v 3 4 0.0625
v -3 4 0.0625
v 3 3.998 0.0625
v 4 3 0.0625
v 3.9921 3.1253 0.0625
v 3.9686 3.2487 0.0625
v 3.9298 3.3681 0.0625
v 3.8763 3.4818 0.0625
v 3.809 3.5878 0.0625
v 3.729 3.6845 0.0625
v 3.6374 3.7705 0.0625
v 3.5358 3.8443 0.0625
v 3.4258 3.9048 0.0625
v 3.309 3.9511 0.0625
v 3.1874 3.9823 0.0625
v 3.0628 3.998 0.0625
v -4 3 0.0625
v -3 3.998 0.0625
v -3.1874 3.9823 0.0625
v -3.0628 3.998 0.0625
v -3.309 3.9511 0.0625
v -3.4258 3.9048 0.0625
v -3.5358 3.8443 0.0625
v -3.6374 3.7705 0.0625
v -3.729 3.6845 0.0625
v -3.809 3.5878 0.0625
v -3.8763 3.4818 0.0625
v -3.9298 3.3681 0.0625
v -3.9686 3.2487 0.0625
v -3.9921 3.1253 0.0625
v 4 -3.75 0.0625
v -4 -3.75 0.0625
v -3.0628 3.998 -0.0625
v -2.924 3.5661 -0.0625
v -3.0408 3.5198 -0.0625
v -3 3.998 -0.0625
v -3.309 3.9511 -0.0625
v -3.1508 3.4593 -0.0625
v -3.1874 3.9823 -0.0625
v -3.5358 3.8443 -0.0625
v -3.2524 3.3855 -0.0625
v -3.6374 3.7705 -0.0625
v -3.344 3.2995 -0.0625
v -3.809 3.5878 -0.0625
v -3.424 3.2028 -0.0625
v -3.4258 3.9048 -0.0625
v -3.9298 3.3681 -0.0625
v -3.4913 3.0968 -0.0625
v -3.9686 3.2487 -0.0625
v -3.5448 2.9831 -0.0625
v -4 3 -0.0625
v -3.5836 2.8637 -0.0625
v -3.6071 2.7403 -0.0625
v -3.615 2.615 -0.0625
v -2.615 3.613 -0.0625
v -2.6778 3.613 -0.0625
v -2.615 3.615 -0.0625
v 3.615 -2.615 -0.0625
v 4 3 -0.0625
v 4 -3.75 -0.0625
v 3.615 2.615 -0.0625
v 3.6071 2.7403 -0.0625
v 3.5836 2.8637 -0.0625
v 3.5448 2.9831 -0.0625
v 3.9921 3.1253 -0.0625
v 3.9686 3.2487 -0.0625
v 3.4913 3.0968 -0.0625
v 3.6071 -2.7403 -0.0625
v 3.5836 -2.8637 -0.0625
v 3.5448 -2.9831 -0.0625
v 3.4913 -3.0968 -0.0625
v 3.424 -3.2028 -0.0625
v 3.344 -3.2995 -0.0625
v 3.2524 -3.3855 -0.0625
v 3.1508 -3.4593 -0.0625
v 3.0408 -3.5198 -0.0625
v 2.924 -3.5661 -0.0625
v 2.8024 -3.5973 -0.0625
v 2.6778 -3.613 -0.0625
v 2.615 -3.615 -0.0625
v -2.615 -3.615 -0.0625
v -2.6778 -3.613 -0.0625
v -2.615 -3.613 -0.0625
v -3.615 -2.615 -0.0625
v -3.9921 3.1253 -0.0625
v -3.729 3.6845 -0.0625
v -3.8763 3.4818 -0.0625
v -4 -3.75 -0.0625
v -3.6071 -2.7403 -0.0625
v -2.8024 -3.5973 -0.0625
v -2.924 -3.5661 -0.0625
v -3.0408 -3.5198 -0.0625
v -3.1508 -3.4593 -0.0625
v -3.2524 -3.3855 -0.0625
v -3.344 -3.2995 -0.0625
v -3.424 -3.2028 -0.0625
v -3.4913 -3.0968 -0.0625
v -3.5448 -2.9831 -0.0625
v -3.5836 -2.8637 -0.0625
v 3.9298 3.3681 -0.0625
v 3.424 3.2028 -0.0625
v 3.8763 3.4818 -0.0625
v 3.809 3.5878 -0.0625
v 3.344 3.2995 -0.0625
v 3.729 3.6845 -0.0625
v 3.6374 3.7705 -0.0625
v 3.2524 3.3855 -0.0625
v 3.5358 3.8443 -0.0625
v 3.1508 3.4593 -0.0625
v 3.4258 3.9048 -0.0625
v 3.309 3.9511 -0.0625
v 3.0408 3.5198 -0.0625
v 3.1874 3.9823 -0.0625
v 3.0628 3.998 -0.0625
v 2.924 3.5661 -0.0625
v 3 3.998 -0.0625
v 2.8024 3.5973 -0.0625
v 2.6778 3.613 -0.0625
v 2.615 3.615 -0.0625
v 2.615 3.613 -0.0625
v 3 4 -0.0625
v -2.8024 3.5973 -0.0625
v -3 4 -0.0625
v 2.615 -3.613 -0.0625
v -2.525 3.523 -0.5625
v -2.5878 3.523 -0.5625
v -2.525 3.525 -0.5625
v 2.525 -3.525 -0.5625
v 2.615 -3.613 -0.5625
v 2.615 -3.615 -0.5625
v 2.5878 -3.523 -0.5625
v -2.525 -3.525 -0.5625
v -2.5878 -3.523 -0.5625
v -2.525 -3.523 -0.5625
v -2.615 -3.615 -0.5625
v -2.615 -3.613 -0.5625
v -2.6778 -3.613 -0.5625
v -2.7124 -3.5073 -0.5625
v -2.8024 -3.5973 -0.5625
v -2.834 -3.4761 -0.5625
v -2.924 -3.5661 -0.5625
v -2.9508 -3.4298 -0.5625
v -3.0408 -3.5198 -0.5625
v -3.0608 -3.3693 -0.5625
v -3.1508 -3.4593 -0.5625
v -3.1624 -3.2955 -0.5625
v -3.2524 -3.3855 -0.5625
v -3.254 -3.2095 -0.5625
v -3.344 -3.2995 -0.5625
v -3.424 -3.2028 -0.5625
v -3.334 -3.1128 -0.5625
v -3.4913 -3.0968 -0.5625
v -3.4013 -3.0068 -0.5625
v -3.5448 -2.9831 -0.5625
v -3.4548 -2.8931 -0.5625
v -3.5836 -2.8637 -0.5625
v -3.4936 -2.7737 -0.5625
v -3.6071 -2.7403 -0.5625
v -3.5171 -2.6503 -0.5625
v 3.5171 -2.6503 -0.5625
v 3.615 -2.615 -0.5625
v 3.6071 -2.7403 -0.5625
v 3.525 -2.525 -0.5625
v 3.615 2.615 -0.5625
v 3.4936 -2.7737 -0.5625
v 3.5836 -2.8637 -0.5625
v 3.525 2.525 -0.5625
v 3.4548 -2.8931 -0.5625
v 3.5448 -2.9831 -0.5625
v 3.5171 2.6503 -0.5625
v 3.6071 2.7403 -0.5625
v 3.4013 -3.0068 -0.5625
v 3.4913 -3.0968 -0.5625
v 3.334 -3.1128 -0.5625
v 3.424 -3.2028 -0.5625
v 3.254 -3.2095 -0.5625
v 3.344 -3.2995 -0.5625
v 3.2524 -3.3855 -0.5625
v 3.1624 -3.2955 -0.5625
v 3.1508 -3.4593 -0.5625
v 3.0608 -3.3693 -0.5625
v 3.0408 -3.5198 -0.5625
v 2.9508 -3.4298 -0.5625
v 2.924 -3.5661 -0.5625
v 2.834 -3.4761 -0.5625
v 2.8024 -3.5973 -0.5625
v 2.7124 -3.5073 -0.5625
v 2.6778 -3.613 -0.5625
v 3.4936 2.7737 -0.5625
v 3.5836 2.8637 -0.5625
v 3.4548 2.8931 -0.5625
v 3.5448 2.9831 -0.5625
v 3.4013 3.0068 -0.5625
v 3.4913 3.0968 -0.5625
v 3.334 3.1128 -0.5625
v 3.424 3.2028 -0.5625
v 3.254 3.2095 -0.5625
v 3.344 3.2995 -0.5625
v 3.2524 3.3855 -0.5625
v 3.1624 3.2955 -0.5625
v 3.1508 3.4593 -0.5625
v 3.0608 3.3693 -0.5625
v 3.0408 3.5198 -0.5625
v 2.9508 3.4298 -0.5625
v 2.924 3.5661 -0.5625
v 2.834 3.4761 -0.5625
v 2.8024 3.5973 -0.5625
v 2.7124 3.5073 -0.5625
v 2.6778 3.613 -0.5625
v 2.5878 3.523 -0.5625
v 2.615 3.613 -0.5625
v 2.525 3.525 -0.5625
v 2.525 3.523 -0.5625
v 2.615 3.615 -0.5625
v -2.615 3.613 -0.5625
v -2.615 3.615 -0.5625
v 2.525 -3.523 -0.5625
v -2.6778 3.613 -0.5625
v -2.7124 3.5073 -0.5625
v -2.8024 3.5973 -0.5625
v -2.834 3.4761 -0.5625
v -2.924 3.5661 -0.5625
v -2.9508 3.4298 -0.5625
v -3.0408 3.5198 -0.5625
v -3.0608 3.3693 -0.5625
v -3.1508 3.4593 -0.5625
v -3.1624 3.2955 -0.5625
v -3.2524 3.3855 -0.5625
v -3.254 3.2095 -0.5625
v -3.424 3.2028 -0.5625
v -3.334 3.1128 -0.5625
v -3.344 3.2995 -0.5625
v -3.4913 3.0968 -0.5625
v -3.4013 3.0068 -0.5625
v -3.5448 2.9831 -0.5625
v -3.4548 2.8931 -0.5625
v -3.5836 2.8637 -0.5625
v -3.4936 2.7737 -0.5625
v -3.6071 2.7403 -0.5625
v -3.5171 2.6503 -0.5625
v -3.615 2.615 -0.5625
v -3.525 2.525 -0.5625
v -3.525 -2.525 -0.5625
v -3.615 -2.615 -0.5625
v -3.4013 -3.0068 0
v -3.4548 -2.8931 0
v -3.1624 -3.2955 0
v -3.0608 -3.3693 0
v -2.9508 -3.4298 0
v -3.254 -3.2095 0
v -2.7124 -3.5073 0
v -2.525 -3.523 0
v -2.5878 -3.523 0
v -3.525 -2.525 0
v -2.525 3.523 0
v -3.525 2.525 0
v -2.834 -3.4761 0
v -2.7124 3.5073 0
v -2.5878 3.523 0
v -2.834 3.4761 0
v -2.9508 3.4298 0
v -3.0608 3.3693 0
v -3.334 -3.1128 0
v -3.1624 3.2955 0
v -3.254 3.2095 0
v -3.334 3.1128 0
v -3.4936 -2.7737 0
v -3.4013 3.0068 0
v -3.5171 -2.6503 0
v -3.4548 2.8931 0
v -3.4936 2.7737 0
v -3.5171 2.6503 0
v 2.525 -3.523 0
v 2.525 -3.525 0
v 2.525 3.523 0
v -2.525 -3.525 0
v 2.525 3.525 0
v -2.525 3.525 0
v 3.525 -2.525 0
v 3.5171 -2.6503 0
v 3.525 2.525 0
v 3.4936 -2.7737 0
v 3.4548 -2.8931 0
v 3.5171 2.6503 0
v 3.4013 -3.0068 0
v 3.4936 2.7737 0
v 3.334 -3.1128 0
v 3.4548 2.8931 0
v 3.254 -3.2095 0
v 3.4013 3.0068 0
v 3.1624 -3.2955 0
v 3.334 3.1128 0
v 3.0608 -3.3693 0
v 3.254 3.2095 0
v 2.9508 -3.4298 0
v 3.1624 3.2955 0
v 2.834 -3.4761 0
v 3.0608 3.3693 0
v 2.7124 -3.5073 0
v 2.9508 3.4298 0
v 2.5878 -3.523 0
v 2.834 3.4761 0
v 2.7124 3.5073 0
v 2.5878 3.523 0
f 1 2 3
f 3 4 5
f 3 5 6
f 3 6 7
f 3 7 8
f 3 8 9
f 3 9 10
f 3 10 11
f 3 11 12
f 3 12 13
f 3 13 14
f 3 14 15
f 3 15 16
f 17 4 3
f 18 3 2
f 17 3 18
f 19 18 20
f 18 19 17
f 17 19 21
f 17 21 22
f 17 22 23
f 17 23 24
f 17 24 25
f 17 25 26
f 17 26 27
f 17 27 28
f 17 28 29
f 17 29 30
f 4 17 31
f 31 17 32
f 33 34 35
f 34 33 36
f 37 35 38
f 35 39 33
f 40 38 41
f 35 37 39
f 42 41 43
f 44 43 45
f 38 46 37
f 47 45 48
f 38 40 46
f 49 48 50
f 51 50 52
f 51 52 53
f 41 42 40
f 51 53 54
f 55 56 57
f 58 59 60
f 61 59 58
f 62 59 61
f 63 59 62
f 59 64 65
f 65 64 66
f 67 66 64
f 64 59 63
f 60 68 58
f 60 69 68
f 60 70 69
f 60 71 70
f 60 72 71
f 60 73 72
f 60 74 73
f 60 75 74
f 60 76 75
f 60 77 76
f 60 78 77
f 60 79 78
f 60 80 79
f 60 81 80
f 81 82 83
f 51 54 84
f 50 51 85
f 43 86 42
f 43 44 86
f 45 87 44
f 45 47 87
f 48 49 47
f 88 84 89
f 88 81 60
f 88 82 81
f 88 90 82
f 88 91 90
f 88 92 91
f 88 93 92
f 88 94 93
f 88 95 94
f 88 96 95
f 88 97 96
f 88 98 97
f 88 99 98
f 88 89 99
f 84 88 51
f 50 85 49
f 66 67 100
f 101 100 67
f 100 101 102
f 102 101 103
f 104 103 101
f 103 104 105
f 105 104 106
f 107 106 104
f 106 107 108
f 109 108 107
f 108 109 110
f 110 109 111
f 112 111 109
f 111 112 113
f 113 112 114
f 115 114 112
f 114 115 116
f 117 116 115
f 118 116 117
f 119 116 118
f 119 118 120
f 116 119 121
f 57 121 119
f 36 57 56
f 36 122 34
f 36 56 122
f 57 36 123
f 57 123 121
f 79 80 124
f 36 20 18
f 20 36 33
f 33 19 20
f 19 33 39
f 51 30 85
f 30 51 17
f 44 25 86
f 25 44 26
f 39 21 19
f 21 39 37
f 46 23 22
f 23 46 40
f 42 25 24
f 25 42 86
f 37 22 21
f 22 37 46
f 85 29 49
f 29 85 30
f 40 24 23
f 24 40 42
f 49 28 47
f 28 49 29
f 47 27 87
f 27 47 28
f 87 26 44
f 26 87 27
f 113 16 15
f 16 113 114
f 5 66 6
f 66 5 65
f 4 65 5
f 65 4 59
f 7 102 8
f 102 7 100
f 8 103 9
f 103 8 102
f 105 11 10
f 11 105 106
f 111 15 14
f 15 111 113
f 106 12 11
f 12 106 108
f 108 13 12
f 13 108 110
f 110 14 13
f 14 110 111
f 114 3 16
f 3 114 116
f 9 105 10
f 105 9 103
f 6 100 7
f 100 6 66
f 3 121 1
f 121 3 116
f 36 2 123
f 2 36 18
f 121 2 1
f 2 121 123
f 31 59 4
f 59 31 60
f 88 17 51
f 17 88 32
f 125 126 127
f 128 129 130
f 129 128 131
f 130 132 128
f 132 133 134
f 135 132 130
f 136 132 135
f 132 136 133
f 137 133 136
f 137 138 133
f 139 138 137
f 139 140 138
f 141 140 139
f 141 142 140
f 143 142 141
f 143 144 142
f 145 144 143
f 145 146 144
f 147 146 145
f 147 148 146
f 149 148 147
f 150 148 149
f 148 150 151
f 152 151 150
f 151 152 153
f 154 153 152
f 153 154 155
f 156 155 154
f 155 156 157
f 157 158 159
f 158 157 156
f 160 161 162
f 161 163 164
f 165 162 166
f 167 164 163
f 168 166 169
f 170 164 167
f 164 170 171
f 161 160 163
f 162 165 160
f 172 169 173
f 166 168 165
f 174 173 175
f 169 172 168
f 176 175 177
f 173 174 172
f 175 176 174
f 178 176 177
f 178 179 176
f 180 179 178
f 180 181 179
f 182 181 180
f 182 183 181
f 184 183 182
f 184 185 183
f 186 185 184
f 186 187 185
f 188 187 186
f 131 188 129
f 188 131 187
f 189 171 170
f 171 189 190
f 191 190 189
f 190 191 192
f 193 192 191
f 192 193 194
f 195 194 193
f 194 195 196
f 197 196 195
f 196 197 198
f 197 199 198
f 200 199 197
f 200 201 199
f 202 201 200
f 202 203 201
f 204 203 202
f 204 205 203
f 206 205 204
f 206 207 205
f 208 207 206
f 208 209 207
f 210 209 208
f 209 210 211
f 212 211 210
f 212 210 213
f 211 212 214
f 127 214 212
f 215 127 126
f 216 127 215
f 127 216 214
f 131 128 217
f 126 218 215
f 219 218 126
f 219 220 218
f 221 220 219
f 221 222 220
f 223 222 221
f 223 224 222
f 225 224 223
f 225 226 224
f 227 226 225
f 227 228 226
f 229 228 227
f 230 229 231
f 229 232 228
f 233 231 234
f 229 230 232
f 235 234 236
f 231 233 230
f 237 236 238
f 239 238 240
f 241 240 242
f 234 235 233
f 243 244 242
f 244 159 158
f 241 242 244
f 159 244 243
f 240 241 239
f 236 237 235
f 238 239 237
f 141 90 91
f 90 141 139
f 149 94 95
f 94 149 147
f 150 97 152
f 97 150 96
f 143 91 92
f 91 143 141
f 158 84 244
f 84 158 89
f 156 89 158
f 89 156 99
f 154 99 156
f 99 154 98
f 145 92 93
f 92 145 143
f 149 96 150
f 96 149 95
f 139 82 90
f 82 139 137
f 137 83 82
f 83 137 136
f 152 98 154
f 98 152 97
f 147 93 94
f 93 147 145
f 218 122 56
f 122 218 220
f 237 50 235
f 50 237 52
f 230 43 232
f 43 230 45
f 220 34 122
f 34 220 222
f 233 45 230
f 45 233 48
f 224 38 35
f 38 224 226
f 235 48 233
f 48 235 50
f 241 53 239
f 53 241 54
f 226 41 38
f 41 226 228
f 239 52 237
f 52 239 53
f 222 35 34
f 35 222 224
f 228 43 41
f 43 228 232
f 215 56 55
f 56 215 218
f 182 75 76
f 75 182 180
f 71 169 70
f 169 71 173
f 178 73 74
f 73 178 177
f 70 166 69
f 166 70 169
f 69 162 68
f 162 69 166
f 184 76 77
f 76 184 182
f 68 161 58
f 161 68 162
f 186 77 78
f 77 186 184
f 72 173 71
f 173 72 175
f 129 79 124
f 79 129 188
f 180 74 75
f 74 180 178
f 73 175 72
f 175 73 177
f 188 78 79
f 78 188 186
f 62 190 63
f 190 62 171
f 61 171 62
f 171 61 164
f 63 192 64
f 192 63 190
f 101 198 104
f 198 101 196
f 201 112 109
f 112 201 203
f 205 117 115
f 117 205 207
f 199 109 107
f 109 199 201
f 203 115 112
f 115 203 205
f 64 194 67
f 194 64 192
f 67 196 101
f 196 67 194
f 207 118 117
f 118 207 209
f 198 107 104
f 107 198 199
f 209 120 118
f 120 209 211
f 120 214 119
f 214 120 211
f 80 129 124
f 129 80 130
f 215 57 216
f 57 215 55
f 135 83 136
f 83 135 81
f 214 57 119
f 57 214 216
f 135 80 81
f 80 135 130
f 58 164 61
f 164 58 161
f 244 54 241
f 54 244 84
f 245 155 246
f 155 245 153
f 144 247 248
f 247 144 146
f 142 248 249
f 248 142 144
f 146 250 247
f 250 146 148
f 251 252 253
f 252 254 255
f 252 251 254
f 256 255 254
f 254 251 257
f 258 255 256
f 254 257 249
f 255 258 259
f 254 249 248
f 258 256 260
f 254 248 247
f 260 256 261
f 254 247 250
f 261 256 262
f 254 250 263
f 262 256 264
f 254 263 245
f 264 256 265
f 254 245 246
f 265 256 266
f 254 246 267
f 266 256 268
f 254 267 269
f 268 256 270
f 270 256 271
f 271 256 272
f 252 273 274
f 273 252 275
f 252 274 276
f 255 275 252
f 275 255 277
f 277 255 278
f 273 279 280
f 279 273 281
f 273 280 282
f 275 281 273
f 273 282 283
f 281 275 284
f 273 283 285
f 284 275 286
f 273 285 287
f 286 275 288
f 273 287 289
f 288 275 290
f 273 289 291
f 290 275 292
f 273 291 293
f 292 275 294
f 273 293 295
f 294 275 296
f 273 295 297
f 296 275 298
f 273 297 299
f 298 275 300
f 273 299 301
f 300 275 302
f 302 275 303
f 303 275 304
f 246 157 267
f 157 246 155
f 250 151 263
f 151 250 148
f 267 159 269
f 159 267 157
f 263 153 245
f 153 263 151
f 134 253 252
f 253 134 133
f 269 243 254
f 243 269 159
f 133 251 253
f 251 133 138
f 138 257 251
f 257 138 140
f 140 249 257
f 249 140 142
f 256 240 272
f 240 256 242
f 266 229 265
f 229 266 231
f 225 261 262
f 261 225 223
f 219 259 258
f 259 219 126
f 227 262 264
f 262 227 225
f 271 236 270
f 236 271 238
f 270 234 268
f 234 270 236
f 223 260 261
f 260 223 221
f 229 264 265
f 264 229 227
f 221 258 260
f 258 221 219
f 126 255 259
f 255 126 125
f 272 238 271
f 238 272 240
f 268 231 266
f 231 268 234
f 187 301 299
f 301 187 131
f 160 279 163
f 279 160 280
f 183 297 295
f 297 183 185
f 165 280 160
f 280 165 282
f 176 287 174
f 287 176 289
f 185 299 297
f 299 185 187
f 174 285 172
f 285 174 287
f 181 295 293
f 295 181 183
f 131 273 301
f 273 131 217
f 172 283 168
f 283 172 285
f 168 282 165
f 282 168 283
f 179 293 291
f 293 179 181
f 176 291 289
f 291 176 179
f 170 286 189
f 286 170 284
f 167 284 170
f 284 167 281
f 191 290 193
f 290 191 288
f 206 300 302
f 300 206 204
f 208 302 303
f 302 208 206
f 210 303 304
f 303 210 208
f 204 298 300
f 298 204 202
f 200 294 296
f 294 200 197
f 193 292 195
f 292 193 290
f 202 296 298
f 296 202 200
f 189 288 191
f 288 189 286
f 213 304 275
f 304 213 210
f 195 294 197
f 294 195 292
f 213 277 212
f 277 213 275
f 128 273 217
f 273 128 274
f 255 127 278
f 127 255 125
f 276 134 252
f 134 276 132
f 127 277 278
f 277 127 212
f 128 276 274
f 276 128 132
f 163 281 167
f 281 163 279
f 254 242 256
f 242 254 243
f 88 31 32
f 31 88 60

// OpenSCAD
use <MCAD/boxes.scad>

$fn = 50;

cornerRadius = 1.0;


difference()
{
    union()
    {
        translate([0, -0.5, 0])
        roundedBox([8,9,0.125], cornerRadius, true );
        
        translate([0,0,-0.25])
        roundedBox([7.23, 7.23, 0.625], cornerRadius, true );
    }
    
    translate([0,0,-0.5])
    roundedBox([7.05, 7.05, 1.0], cornerRadius, true );

    translate([0,-4.75,0])
    cube([10,2,1], true );
}
